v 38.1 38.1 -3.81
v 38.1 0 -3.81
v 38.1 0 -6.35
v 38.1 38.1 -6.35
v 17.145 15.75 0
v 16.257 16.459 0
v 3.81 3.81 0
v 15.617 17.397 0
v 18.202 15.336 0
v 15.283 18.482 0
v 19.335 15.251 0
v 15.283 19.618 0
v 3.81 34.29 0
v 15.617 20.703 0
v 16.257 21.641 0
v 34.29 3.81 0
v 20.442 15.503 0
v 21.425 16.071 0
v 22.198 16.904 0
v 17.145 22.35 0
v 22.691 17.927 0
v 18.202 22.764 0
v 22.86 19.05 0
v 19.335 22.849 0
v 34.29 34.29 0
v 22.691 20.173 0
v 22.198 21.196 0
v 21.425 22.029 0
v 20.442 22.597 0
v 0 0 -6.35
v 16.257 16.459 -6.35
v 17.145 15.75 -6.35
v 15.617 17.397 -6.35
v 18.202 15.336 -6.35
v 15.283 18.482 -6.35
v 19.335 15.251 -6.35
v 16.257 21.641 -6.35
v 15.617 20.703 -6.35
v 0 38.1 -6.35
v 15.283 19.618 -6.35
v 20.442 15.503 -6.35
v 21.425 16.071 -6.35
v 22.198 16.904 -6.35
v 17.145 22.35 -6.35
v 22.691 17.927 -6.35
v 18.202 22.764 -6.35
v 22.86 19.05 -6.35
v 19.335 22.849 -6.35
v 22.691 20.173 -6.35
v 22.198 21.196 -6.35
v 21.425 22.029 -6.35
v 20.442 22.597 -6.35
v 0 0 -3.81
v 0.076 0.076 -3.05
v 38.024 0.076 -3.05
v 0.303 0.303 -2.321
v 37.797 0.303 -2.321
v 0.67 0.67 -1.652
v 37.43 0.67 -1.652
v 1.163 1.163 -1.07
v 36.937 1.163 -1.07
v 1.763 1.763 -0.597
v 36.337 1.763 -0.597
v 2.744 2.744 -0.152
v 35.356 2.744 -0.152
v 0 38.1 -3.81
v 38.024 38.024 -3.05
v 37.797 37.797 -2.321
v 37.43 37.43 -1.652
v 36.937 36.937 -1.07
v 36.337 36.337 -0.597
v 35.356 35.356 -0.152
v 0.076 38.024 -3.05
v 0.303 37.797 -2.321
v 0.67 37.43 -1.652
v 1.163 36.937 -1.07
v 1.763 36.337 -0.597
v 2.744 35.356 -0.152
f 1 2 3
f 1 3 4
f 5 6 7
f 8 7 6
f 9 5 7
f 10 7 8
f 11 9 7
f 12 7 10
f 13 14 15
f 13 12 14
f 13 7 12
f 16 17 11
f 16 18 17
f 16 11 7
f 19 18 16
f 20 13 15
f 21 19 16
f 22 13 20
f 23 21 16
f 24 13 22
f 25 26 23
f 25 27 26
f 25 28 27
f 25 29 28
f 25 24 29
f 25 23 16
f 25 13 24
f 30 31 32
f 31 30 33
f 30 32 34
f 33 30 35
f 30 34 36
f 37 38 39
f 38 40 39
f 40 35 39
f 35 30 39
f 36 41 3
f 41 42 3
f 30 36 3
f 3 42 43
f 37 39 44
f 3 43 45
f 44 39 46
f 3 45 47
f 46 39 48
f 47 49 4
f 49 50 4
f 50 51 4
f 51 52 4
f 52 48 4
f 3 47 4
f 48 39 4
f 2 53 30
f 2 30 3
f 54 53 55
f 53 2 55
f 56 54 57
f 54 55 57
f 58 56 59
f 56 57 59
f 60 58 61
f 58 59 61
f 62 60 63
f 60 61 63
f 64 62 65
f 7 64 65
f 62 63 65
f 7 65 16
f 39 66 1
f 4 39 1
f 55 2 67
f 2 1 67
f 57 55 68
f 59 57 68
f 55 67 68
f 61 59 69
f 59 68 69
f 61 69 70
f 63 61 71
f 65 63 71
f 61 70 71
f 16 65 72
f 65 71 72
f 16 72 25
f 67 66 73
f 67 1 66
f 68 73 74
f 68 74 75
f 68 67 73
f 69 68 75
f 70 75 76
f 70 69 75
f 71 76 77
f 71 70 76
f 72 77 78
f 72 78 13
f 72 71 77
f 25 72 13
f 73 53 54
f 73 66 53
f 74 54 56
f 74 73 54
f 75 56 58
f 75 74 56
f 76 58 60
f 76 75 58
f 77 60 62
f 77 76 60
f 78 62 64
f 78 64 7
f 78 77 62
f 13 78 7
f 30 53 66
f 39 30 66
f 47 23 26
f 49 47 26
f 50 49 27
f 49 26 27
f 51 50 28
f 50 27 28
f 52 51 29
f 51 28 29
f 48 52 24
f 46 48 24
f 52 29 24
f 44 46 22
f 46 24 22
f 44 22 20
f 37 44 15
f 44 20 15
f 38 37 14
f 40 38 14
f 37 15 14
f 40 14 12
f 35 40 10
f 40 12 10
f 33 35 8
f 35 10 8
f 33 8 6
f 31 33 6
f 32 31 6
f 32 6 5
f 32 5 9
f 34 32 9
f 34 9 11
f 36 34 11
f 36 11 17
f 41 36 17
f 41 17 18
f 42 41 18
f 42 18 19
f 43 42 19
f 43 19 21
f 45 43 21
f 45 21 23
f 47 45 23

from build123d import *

# Parameters (mm, degrees)
F0_W     = 38.1
F0_H     = 38.1
F1_DEPTH = 6.35
F2_R     = 3.81
F3_R     = 3.81
F4_DEPTH = 6.351


with BuildPart() as f1:
    # F0 (on Top) → F1 (new body)
    with BuildSketch(Plane.XY):
        with Locations((19.05, 19.05)):
            Rectangle(F0_W, F0_H)
    extrude(amount=-F1_DEPTH)

    # F2
    f2_edges = [f1.edges().sort_by_distance(p)[0] for p in [
        (0, 19.05, 0),
        (19.05, 0, 0),
        (38.1, 19.05, 0),
        (19.05, 38.1, 0),
    ]]
    fillet(f2_edges, radius=F2_R)

    # F3 (on face) → F4 (cut, through all)
    with BuildSketch(Plane.XY):
        with Locations((19.05, 19.05)):
            Circle(F3_R)
    extrude(amount=-F4_DEPTH, mode=Mode.SUBTRACT)


solid = f1.part
